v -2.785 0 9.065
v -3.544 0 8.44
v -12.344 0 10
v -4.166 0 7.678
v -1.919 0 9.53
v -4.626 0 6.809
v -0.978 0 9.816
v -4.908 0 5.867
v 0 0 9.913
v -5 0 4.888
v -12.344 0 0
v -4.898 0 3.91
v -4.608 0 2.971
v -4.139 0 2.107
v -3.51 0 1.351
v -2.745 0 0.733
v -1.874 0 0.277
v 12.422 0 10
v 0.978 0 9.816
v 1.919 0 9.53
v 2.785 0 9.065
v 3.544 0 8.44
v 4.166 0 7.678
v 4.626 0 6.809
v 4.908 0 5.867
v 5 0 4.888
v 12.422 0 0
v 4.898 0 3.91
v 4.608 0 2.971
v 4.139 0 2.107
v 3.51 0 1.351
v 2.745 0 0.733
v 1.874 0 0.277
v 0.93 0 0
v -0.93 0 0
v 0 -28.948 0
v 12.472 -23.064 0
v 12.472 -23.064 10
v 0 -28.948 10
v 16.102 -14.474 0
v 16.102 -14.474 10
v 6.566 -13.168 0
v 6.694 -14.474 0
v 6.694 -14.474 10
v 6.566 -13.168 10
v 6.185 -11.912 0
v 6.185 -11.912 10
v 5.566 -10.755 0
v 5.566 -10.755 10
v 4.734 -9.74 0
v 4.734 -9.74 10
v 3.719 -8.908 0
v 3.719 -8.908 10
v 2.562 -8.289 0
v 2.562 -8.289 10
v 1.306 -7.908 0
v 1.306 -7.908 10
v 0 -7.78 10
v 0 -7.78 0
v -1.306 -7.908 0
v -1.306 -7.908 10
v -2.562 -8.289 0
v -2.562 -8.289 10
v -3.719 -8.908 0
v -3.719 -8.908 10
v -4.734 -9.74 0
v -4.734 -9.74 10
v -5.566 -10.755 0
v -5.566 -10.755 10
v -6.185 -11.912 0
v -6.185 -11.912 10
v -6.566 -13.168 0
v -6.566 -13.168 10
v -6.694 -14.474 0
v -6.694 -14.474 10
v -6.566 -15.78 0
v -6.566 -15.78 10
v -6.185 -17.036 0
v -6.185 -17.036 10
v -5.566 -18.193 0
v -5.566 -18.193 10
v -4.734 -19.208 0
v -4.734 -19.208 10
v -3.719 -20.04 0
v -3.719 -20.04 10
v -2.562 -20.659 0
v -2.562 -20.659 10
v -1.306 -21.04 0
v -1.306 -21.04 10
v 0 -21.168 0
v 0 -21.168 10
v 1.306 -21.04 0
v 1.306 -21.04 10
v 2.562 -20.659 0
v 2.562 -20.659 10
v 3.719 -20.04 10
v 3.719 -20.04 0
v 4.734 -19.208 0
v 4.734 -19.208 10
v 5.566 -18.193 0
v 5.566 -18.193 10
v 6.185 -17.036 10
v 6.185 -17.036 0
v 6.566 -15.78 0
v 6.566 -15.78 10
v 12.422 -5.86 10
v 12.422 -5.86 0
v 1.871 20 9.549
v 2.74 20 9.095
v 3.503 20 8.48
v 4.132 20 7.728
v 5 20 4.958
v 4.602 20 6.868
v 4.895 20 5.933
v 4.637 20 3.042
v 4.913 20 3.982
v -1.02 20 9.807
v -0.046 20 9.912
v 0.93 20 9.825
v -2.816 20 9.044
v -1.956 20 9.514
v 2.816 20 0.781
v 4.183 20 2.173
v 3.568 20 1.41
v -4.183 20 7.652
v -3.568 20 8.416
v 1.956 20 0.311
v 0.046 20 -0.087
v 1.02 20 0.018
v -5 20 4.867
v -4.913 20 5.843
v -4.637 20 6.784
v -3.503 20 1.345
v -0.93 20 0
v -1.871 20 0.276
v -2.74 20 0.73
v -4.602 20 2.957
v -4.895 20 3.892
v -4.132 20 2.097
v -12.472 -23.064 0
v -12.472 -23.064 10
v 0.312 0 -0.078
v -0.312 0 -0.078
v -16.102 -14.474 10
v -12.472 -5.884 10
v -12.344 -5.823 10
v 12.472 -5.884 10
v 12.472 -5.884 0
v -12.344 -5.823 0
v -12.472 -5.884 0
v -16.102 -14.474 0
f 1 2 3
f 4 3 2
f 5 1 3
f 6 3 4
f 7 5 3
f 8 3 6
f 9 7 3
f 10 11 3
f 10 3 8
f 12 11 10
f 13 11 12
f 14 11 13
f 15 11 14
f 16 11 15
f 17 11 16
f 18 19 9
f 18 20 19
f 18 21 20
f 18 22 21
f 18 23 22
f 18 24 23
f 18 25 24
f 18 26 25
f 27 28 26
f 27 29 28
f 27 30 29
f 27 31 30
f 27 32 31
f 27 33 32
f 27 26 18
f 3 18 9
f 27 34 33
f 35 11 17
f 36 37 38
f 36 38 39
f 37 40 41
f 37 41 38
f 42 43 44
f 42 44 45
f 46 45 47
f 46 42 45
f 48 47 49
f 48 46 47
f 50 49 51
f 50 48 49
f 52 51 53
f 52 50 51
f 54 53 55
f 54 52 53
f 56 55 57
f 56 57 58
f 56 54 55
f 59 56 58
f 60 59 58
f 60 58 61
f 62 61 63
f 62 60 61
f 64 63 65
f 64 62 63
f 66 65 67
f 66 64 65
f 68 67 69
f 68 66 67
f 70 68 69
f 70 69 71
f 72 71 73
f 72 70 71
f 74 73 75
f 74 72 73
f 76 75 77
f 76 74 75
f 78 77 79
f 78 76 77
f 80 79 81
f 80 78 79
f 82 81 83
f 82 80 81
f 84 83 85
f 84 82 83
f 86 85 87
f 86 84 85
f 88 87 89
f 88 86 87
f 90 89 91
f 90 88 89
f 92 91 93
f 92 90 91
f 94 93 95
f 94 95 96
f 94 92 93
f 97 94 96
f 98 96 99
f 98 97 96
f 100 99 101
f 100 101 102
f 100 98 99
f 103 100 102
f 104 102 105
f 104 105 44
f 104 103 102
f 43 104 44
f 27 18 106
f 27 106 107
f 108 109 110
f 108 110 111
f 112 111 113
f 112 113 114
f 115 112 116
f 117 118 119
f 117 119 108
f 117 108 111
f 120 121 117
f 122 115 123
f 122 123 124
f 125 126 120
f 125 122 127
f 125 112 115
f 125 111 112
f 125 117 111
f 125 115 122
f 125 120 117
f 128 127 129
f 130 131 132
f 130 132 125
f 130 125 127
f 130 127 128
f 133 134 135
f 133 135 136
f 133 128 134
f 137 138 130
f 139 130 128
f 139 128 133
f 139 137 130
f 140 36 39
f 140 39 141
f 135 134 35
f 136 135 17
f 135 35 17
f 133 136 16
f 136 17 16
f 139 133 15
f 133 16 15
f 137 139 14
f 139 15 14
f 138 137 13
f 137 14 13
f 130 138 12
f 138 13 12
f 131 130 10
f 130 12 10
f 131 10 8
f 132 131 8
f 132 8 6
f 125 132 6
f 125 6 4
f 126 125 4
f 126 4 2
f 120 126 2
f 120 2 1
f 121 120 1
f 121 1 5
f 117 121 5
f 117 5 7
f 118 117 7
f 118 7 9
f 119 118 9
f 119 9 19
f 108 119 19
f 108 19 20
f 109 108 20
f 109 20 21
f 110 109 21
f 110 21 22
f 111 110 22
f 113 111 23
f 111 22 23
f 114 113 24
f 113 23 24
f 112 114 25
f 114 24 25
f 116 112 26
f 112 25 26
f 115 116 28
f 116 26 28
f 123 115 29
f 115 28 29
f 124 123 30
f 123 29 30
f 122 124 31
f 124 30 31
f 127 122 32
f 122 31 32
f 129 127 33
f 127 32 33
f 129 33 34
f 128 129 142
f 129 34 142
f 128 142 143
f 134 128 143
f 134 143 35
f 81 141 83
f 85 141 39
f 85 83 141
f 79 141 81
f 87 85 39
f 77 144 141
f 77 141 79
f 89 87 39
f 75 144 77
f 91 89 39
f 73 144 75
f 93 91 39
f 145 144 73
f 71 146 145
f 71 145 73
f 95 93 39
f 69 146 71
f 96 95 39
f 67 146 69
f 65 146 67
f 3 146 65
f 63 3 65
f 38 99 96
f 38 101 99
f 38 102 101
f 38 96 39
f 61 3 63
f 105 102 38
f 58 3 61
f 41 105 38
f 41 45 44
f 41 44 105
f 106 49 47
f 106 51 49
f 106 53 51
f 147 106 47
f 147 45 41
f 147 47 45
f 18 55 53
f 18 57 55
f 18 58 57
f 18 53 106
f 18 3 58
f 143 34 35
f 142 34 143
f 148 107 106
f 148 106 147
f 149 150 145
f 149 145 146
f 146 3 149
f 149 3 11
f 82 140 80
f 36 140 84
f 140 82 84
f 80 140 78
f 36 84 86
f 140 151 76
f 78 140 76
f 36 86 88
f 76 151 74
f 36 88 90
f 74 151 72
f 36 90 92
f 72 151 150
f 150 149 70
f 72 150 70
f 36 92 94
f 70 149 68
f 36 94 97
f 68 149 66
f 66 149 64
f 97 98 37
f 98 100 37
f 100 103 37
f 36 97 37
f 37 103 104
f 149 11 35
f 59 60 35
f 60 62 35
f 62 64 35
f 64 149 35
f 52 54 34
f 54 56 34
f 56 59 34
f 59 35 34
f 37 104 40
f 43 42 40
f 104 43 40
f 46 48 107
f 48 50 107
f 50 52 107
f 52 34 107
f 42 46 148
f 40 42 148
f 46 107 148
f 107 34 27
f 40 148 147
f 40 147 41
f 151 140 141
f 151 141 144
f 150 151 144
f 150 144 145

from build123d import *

# Parameters (mm, degrees)
SKETCH1_R           = 6.694456565
BOSS_EXTRUDE1_DEPTH = 10
SKETCH2_W           = 24.765512155
SKETCH2_H           = 10
BOSS_EXTRUDE2_DEPTH = 7
SKETCH4_R           = 5
BOSS_EXTRUDE4_DEPTH = 20


with BuildPart() as part:
    # Sketch1 → Boss-Extrude1 (new body)
    with BuildSketch(Plane.XY):
        Polygon((-12.471629347, -23.064398423), (-16.102258105, -14.474005392), (-12.471629347, -5.883612362), (0, 0), (12.471629347, -5.883612362), (16.102258105, -14.474005392), (12.471629347, -23.064398423), (0, -28.948010785), align=None)
        with Locations((0, -14.474005392)):
            Circle(SKETCH1_R, mode=Mode.SUBTRACT)
    extrude(amount=BOSS_EXTRUDE1_DEPTH)

    # Sketch2 → Boss-Extrude2 (add)
    with BuildSketch(Plane(origin=(0, 0, 0), x_dir=(1, 0, 0), z_dir=(0, 1, 0))):
        with Locations((0.039254209, -5)):
            Rectangle(SKETCH2_W, SKETCH2_H)
    extrude(amount=-BOSS_EXTRUDE2_DEPTH)

    # Sketch4 → Boss-Extrude4 (add)
    with BuildSketch(Plane(origin=(0, 0, 0), x_dir=(1, 0, 0), z_dir=(0, 1, 0))):
        with Locations(Location((0, -4.912660405, 0), (0, 0, 100.724879792))):
            Circle(SKETCH4_R)
    extrude(amount=BOSS_EXTRUDE4_DEPTH)


solid = part.part
